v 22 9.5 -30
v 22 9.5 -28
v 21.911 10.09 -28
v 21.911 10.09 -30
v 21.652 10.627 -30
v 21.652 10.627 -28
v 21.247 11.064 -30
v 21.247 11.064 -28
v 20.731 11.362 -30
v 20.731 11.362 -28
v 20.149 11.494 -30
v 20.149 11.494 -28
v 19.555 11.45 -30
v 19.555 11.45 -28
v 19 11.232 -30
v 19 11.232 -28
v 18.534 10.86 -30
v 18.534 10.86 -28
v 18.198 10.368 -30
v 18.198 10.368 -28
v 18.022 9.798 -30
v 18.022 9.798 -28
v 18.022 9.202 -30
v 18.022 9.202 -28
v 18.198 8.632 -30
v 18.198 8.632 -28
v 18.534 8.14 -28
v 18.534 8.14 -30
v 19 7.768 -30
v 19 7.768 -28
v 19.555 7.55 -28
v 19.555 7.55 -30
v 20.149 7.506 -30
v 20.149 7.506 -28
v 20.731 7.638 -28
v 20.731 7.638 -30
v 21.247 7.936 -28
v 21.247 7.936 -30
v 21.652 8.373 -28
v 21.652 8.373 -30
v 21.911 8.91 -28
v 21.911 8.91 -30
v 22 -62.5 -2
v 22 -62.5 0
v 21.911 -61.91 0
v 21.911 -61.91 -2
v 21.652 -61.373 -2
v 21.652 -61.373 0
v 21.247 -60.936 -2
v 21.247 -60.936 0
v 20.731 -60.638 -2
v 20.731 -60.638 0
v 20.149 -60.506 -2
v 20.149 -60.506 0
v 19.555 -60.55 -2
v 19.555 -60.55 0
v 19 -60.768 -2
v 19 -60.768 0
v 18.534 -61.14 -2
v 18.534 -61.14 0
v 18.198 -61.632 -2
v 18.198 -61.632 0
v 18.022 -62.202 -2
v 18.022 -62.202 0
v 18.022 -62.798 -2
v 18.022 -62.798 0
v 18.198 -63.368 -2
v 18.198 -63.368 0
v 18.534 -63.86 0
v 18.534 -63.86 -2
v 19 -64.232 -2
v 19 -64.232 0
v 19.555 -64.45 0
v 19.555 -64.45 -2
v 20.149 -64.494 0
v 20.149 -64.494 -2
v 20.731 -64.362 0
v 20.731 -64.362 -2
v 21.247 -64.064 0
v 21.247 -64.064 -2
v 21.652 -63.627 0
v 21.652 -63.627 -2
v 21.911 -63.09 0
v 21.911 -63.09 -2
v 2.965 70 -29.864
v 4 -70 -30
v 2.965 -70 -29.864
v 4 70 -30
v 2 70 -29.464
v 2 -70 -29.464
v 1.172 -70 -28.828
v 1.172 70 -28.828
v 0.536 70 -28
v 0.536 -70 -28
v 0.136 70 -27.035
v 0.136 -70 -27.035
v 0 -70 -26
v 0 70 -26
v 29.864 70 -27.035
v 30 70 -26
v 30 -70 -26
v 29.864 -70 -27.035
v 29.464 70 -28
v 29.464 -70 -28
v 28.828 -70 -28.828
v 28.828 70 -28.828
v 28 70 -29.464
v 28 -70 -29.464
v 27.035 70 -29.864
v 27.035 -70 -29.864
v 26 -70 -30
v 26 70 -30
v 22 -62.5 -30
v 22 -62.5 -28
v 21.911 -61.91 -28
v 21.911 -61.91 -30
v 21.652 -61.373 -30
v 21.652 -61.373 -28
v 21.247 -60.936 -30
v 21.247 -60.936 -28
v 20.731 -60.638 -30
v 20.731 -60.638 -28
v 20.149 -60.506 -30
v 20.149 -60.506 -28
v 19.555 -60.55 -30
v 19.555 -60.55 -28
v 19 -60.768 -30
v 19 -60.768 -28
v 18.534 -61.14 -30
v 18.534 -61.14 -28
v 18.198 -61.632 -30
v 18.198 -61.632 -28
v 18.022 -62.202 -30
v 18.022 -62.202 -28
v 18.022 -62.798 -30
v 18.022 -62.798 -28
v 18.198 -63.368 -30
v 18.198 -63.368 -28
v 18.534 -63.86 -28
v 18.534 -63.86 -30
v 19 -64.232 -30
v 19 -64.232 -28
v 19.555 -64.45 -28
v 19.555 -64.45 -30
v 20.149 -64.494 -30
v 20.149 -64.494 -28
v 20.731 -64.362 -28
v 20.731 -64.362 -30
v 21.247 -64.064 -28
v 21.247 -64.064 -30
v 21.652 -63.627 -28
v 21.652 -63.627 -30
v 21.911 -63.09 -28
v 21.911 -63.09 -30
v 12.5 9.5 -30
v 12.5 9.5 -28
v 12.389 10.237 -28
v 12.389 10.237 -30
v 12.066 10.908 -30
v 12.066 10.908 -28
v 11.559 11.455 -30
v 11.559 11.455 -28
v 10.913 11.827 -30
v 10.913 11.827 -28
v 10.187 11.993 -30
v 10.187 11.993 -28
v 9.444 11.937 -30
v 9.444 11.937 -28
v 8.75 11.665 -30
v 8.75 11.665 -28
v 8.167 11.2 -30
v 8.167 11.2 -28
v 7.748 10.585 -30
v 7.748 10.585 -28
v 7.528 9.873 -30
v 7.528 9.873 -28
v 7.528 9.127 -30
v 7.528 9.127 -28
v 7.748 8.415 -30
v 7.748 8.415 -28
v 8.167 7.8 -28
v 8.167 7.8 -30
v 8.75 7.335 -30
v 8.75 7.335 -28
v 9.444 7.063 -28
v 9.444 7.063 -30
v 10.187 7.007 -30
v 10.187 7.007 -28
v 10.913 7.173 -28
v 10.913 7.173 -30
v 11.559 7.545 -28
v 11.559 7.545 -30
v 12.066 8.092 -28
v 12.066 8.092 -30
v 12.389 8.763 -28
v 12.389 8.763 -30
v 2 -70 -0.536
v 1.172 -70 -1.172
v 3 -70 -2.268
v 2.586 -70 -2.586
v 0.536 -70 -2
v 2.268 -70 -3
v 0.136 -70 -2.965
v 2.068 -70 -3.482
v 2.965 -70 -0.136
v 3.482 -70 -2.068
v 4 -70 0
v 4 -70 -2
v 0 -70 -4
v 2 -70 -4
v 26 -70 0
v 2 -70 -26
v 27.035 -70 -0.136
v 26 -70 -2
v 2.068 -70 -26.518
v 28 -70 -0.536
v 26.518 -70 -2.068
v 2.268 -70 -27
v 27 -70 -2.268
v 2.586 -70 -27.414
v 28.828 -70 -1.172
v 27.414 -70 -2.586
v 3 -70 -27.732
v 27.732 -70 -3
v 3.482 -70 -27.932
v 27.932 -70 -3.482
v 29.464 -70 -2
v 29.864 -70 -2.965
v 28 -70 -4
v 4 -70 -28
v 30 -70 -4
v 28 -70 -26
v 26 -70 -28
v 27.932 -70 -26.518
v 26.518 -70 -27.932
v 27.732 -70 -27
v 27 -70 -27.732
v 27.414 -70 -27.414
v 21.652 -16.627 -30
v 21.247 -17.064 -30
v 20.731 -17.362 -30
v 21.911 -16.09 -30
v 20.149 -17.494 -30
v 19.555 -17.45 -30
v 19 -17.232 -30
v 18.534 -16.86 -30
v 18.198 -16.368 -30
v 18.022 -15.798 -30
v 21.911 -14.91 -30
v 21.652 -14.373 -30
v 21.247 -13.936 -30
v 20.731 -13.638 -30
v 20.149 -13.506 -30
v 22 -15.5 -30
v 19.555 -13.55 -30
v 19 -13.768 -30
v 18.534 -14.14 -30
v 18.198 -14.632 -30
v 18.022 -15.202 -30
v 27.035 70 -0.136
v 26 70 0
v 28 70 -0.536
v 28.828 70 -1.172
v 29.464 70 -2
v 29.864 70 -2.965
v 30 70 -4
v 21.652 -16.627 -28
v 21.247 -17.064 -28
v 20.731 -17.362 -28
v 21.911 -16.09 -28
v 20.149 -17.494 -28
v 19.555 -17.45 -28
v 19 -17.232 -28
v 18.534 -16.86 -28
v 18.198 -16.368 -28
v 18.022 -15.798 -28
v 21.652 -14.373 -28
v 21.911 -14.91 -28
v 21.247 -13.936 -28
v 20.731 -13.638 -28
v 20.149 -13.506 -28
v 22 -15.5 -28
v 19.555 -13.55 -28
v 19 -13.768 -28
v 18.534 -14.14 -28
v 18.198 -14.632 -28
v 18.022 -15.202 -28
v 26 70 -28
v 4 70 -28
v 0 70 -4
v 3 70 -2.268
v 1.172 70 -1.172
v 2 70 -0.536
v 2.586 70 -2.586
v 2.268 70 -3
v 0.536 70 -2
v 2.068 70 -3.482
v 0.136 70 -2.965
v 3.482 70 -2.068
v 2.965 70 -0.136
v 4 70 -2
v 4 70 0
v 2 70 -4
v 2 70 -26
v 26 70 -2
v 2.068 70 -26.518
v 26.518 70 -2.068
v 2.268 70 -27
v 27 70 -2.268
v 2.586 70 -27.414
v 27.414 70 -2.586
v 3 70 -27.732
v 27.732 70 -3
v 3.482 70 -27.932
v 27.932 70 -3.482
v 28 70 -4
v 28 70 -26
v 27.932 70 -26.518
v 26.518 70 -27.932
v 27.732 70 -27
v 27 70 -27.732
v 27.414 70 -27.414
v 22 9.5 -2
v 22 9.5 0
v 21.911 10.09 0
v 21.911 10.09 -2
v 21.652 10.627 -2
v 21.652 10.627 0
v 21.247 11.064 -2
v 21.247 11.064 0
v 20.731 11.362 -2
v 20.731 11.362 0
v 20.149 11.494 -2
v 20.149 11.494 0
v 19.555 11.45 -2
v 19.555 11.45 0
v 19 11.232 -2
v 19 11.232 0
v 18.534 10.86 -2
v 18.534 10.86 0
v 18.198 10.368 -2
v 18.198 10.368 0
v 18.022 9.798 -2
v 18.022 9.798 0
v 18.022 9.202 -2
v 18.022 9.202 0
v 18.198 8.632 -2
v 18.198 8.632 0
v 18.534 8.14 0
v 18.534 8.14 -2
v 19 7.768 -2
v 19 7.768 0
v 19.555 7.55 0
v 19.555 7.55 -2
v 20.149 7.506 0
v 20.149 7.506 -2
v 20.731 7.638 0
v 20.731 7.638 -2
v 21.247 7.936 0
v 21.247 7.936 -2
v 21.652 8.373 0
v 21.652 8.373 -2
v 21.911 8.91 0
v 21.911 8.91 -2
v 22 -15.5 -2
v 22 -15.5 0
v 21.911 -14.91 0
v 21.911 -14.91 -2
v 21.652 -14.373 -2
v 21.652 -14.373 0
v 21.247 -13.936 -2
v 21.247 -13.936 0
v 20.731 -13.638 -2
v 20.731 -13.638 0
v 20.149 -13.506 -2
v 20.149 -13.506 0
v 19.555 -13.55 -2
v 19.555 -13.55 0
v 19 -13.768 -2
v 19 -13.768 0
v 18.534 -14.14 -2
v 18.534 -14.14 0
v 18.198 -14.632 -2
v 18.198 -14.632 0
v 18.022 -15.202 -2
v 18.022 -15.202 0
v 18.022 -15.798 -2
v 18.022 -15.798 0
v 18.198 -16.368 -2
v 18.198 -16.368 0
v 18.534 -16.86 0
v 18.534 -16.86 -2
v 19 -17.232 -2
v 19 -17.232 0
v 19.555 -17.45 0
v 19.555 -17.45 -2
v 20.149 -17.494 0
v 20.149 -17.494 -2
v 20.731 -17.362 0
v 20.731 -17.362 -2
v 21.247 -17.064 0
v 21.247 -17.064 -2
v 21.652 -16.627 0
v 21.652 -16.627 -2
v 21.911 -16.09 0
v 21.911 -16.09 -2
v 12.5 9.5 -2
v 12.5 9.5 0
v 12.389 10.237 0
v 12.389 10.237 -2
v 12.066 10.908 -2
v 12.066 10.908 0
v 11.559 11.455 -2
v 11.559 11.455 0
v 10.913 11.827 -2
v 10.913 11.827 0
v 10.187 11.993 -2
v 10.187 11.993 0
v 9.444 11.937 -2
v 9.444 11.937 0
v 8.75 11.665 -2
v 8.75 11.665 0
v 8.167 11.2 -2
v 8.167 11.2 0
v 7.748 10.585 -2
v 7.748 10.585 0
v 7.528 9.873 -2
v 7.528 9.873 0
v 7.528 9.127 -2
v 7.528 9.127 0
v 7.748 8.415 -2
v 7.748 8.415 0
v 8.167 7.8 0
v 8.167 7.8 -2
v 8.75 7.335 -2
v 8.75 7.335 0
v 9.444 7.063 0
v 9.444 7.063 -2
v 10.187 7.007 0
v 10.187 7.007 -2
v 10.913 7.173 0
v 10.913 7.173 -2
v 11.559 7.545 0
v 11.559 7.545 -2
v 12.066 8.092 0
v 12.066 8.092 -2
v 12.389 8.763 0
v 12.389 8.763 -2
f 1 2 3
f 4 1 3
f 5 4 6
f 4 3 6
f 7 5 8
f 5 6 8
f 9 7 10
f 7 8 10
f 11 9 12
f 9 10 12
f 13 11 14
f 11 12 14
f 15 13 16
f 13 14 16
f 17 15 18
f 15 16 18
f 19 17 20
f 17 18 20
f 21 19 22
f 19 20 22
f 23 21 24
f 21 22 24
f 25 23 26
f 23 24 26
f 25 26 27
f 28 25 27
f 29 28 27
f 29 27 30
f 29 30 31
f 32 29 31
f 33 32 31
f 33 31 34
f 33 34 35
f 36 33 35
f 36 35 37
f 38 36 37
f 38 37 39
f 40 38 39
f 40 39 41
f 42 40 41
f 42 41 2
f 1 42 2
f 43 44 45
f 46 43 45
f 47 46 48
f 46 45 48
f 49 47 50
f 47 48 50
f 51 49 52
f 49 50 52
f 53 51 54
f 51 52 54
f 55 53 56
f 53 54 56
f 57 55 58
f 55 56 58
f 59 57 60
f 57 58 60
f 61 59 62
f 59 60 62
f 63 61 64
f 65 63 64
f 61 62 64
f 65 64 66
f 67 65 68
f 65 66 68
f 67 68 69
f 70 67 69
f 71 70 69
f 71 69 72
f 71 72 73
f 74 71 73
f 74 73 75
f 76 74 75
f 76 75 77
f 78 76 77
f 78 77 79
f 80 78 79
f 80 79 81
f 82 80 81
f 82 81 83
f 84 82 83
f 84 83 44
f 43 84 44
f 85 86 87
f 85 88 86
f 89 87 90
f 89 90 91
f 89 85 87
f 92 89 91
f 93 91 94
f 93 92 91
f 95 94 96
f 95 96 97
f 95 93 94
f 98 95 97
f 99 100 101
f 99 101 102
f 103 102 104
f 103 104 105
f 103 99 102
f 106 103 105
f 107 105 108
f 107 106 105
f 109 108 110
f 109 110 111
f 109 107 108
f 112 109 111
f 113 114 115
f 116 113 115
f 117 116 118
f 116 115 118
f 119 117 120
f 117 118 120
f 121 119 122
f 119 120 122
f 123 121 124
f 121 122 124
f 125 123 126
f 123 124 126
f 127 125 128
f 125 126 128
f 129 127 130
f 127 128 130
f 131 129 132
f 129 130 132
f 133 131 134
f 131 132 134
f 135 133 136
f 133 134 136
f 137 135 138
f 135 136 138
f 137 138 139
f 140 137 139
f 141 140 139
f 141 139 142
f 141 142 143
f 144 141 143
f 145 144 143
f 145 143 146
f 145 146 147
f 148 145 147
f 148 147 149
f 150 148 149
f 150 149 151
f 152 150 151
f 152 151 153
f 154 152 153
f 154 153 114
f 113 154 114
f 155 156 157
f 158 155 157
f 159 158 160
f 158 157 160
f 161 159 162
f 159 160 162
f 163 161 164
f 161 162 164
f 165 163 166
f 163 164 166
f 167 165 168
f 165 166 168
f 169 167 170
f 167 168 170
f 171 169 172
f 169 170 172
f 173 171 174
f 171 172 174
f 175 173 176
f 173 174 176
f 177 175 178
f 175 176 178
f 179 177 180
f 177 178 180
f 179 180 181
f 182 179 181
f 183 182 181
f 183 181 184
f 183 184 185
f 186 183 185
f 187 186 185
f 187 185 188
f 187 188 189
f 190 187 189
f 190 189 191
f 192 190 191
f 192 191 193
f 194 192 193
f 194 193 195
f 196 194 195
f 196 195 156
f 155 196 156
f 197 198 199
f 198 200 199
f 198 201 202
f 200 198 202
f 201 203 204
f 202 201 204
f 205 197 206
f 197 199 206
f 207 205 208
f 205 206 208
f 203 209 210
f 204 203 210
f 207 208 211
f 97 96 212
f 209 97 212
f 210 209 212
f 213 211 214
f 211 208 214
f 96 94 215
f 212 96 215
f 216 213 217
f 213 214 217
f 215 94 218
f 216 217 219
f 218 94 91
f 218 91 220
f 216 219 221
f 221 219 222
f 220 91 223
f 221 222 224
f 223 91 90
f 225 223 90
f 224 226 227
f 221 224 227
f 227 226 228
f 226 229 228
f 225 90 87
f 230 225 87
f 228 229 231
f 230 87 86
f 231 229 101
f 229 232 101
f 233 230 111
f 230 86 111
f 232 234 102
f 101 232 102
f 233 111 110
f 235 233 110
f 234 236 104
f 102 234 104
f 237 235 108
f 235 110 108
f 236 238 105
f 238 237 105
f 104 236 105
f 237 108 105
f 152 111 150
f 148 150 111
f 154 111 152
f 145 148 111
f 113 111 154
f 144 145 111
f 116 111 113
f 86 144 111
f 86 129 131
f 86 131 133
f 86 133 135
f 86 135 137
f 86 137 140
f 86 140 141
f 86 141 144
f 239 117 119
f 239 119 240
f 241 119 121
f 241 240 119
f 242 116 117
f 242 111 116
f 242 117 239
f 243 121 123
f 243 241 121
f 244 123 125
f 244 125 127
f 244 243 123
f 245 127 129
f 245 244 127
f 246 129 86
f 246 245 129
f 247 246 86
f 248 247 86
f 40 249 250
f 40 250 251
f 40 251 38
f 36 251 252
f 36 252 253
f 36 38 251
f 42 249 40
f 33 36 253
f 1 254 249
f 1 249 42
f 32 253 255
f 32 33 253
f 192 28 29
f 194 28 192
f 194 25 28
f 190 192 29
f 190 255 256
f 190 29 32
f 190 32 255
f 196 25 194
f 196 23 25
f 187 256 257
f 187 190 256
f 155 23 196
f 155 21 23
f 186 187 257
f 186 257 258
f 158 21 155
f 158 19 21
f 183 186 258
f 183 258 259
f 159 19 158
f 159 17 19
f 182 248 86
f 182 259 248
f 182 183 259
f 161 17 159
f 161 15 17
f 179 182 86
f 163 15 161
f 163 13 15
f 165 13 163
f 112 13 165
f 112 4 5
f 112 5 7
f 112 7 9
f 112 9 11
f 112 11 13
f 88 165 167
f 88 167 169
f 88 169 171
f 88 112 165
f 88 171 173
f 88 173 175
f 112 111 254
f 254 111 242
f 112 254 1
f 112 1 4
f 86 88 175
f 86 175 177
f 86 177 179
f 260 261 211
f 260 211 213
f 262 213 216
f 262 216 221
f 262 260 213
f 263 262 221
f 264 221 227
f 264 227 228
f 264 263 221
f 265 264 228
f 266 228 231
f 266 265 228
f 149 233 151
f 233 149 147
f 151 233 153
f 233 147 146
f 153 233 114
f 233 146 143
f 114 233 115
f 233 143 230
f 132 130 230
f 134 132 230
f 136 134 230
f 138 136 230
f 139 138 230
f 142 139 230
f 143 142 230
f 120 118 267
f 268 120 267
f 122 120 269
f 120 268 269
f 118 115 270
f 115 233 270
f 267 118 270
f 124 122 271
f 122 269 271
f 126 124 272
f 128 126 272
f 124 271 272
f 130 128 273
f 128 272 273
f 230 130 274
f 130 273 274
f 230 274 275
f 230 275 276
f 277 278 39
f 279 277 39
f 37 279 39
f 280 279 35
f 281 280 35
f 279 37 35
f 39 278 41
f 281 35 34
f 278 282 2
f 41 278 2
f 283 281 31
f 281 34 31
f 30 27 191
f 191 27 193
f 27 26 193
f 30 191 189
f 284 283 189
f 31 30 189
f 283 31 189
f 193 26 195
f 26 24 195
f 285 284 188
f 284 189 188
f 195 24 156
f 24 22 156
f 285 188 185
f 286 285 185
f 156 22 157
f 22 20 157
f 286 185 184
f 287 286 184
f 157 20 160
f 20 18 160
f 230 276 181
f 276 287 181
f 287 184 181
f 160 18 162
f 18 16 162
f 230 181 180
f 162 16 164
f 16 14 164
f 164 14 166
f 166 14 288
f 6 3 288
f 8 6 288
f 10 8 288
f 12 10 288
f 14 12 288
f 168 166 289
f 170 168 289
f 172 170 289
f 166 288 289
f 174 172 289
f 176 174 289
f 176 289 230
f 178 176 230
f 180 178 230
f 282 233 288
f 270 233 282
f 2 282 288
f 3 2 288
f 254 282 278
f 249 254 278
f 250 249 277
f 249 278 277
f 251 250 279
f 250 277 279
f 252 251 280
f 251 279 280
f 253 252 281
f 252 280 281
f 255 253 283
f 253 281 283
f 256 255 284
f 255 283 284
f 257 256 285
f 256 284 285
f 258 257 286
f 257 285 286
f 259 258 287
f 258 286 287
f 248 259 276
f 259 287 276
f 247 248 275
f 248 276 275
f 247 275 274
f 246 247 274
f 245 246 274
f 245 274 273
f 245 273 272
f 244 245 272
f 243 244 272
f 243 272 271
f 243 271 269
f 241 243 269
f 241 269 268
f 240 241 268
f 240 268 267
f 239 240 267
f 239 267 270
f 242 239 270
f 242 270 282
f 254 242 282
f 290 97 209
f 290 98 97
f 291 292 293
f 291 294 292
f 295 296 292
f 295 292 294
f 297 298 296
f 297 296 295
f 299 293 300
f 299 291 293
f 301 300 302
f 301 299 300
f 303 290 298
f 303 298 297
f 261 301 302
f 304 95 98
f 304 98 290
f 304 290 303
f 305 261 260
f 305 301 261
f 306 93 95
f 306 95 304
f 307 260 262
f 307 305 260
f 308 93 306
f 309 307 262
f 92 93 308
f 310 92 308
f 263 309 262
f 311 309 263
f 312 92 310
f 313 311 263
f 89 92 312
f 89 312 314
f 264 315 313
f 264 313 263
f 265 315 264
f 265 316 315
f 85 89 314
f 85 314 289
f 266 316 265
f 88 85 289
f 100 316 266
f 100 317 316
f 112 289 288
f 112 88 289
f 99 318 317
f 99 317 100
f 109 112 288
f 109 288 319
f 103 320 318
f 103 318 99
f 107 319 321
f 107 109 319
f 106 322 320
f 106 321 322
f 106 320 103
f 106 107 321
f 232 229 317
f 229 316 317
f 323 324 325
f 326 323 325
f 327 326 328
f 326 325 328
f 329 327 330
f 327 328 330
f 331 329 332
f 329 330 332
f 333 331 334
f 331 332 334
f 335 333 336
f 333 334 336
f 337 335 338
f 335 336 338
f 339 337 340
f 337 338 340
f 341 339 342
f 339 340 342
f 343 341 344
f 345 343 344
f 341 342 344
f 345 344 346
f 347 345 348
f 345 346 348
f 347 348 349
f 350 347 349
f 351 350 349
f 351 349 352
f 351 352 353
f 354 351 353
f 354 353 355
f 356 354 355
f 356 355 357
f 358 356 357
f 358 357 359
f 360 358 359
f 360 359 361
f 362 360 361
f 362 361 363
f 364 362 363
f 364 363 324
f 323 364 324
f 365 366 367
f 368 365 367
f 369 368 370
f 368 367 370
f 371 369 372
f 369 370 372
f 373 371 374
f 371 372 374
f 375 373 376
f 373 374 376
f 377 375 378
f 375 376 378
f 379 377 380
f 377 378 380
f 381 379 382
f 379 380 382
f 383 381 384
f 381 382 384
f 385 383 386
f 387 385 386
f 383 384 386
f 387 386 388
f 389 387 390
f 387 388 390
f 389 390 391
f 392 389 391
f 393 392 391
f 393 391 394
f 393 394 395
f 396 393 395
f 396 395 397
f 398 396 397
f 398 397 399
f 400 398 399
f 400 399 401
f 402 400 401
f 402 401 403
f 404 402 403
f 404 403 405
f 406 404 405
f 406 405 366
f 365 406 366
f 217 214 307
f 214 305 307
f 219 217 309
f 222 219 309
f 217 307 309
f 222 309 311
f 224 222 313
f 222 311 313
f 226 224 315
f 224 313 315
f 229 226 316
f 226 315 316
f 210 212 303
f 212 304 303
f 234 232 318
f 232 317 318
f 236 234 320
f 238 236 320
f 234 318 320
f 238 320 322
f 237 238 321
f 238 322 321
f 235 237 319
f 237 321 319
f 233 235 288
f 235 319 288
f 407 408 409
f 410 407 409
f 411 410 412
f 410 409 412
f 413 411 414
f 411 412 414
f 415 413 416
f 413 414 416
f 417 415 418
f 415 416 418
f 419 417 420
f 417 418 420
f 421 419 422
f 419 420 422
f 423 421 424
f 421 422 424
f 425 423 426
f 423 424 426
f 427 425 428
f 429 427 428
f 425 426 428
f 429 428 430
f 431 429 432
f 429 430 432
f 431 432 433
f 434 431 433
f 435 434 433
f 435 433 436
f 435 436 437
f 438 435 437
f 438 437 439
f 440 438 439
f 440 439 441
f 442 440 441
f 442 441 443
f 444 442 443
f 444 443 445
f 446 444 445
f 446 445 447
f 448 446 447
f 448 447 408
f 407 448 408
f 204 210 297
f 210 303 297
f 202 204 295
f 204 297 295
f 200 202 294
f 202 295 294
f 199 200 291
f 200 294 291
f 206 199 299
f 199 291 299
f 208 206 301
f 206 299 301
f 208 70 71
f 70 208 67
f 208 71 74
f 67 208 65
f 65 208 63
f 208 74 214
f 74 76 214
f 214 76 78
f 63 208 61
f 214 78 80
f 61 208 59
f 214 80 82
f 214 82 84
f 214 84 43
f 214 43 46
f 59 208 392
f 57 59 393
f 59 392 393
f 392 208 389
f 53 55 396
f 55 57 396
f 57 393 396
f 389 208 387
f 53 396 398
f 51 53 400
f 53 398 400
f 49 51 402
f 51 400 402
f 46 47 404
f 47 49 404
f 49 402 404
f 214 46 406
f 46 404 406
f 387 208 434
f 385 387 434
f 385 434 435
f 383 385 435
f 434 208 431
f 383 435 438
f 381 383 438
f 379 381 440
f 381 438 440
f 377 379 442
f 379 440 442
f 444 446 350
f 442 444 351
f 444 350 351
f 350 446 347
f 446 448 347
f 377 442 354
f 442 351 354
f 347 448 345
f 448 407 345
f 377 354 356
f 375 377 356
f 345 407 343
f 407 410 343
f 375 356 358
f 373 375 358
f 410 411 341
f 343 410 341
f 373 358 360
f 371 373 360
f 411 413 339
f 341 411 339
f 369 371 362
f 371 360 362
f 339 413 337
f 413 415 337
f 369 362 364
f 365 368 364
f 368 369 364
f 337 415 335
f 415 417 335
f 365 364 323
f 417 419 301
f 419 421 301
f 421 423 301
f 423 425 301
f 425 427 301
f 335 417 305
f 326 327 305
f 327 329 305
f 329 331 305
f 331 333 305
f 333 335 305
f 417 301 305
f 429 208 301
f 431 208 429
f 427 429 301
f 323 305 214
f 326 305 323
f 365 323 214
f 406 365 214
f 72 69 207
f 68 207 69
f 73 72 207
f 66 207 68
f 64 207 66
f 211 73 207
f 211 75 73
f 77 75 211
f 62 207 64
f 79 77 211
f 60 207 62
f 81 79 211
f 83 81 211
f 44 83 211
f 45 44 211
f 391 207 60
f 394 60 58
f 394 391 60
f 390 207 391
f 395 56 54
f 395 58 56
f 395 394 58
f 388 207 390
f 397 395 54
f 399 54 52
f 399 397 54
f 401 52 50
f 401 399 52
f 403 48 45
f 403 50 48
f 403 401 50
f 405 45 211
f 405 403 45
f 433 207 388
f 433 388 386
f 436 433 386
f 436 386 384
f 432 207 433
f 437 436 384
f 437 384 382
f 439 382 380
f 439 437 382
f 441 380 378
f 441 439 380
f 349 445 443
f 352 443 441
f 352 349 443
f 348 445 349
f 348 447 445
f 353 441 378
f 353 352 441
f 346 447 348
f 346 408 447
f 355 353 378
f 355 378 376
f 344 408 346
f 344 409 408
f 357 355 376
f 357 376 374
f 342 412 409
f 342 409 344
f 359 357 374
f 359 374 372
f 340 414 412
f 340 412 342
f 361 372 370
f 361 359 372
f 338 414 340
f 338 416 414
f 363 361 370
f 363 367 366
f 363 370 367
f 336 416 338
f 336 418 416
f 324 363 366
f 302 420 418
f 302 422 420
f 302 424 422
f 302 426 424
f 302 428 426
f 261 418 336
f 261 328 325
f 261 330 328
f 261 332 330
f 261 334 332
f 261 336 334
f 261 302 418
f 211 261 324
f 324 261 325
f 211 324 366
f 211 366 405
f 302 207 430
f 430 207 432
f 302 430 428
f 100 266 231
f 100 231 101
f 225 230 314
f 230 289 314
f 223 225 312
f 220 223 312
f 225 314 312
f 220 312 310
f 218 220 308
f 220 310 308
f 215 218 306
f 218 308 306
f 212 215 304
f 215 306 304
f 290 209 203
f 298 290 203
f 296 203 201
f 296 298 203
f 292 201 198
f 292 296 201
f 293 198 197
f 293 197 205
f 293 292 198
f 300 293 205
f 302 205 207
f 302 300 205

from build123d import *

# Parameters (mm, degrees)
EXTRUDE_1_DEPTH     = 70
SKETCH_3_R          = 2.5
SKETCH_3_R_2        = 2
CUT_EXTRUDE_1_DEPTH = 82.853527719


with BuildPart() as part:
    # 草图2 → 凸台-拉伸1 (new, symmetric)
    with BuildSketch(Plane(origin=(0, 0, 0), x_dir=(1, 0, 0), z_dir=(0, 1, 0))):
        with BuildLine():
            Line((4, 0), (26, 0))
            ThreePointArc((26, 0), (28.828427125, 1.171572875), (30, 4))
            Line((30, 4), (30, 26))
            ThreePointArc((30, 26), (28.828427125, 28.828427125), (26, 30))
            Line((26, 30), (4, 30))
            ThreePointArc((4, 30), (1.171572875, 28.828427125), (0, 26))
            Line((0, 26), (0, 4))
            ThreePointArc((0, 4), (1.171572875, 1.171572875), (4, 0))
        make_face()
        with BuildLine():
            Line((4, 2), (26, 2))
            ThreePointArc((26, 2), (27.414213562, 2.585786438), (28, 4))
            Line((28, 4), (28, 26))
            ThreePointArc((28, 26), (27.414213562, 27.414213562), (26, 28))
            Line((26, 28), (4, 28))
            ThreePointArc((4, 28), (2.585786438, 27.414213562), (2, 26))
            Line((2, 26), (2, 4))
            ThreePointArc((2, 4), (2.585786438, 2.585786438), (4, 2))
        make_face(mode=Mode.SUBTRACT)
    extrude(amount=EXTRUDE_1_DEPTH, both=True)

    # 草图3 → 切除-拉伸1 (cut, through all)
    with BuildSketch(Plane.XY):
        with Locations((10, 9.5)):
            Circle(SKETCH_3_R)
        with Locations((20, 9.5)):
            Circle(SKETCH_3_R_2)
        with Locations((20, -15.5)):
            Circle(SKETCH_3_R_2)
        with Locations((20, -62.5)):
            Circle(SKETCH_3_R_2)
    extrude(amount=-CUT_EXTRUDE_1_DEPTH, mode=Mode.SUBTRACT)


solid = part.part
